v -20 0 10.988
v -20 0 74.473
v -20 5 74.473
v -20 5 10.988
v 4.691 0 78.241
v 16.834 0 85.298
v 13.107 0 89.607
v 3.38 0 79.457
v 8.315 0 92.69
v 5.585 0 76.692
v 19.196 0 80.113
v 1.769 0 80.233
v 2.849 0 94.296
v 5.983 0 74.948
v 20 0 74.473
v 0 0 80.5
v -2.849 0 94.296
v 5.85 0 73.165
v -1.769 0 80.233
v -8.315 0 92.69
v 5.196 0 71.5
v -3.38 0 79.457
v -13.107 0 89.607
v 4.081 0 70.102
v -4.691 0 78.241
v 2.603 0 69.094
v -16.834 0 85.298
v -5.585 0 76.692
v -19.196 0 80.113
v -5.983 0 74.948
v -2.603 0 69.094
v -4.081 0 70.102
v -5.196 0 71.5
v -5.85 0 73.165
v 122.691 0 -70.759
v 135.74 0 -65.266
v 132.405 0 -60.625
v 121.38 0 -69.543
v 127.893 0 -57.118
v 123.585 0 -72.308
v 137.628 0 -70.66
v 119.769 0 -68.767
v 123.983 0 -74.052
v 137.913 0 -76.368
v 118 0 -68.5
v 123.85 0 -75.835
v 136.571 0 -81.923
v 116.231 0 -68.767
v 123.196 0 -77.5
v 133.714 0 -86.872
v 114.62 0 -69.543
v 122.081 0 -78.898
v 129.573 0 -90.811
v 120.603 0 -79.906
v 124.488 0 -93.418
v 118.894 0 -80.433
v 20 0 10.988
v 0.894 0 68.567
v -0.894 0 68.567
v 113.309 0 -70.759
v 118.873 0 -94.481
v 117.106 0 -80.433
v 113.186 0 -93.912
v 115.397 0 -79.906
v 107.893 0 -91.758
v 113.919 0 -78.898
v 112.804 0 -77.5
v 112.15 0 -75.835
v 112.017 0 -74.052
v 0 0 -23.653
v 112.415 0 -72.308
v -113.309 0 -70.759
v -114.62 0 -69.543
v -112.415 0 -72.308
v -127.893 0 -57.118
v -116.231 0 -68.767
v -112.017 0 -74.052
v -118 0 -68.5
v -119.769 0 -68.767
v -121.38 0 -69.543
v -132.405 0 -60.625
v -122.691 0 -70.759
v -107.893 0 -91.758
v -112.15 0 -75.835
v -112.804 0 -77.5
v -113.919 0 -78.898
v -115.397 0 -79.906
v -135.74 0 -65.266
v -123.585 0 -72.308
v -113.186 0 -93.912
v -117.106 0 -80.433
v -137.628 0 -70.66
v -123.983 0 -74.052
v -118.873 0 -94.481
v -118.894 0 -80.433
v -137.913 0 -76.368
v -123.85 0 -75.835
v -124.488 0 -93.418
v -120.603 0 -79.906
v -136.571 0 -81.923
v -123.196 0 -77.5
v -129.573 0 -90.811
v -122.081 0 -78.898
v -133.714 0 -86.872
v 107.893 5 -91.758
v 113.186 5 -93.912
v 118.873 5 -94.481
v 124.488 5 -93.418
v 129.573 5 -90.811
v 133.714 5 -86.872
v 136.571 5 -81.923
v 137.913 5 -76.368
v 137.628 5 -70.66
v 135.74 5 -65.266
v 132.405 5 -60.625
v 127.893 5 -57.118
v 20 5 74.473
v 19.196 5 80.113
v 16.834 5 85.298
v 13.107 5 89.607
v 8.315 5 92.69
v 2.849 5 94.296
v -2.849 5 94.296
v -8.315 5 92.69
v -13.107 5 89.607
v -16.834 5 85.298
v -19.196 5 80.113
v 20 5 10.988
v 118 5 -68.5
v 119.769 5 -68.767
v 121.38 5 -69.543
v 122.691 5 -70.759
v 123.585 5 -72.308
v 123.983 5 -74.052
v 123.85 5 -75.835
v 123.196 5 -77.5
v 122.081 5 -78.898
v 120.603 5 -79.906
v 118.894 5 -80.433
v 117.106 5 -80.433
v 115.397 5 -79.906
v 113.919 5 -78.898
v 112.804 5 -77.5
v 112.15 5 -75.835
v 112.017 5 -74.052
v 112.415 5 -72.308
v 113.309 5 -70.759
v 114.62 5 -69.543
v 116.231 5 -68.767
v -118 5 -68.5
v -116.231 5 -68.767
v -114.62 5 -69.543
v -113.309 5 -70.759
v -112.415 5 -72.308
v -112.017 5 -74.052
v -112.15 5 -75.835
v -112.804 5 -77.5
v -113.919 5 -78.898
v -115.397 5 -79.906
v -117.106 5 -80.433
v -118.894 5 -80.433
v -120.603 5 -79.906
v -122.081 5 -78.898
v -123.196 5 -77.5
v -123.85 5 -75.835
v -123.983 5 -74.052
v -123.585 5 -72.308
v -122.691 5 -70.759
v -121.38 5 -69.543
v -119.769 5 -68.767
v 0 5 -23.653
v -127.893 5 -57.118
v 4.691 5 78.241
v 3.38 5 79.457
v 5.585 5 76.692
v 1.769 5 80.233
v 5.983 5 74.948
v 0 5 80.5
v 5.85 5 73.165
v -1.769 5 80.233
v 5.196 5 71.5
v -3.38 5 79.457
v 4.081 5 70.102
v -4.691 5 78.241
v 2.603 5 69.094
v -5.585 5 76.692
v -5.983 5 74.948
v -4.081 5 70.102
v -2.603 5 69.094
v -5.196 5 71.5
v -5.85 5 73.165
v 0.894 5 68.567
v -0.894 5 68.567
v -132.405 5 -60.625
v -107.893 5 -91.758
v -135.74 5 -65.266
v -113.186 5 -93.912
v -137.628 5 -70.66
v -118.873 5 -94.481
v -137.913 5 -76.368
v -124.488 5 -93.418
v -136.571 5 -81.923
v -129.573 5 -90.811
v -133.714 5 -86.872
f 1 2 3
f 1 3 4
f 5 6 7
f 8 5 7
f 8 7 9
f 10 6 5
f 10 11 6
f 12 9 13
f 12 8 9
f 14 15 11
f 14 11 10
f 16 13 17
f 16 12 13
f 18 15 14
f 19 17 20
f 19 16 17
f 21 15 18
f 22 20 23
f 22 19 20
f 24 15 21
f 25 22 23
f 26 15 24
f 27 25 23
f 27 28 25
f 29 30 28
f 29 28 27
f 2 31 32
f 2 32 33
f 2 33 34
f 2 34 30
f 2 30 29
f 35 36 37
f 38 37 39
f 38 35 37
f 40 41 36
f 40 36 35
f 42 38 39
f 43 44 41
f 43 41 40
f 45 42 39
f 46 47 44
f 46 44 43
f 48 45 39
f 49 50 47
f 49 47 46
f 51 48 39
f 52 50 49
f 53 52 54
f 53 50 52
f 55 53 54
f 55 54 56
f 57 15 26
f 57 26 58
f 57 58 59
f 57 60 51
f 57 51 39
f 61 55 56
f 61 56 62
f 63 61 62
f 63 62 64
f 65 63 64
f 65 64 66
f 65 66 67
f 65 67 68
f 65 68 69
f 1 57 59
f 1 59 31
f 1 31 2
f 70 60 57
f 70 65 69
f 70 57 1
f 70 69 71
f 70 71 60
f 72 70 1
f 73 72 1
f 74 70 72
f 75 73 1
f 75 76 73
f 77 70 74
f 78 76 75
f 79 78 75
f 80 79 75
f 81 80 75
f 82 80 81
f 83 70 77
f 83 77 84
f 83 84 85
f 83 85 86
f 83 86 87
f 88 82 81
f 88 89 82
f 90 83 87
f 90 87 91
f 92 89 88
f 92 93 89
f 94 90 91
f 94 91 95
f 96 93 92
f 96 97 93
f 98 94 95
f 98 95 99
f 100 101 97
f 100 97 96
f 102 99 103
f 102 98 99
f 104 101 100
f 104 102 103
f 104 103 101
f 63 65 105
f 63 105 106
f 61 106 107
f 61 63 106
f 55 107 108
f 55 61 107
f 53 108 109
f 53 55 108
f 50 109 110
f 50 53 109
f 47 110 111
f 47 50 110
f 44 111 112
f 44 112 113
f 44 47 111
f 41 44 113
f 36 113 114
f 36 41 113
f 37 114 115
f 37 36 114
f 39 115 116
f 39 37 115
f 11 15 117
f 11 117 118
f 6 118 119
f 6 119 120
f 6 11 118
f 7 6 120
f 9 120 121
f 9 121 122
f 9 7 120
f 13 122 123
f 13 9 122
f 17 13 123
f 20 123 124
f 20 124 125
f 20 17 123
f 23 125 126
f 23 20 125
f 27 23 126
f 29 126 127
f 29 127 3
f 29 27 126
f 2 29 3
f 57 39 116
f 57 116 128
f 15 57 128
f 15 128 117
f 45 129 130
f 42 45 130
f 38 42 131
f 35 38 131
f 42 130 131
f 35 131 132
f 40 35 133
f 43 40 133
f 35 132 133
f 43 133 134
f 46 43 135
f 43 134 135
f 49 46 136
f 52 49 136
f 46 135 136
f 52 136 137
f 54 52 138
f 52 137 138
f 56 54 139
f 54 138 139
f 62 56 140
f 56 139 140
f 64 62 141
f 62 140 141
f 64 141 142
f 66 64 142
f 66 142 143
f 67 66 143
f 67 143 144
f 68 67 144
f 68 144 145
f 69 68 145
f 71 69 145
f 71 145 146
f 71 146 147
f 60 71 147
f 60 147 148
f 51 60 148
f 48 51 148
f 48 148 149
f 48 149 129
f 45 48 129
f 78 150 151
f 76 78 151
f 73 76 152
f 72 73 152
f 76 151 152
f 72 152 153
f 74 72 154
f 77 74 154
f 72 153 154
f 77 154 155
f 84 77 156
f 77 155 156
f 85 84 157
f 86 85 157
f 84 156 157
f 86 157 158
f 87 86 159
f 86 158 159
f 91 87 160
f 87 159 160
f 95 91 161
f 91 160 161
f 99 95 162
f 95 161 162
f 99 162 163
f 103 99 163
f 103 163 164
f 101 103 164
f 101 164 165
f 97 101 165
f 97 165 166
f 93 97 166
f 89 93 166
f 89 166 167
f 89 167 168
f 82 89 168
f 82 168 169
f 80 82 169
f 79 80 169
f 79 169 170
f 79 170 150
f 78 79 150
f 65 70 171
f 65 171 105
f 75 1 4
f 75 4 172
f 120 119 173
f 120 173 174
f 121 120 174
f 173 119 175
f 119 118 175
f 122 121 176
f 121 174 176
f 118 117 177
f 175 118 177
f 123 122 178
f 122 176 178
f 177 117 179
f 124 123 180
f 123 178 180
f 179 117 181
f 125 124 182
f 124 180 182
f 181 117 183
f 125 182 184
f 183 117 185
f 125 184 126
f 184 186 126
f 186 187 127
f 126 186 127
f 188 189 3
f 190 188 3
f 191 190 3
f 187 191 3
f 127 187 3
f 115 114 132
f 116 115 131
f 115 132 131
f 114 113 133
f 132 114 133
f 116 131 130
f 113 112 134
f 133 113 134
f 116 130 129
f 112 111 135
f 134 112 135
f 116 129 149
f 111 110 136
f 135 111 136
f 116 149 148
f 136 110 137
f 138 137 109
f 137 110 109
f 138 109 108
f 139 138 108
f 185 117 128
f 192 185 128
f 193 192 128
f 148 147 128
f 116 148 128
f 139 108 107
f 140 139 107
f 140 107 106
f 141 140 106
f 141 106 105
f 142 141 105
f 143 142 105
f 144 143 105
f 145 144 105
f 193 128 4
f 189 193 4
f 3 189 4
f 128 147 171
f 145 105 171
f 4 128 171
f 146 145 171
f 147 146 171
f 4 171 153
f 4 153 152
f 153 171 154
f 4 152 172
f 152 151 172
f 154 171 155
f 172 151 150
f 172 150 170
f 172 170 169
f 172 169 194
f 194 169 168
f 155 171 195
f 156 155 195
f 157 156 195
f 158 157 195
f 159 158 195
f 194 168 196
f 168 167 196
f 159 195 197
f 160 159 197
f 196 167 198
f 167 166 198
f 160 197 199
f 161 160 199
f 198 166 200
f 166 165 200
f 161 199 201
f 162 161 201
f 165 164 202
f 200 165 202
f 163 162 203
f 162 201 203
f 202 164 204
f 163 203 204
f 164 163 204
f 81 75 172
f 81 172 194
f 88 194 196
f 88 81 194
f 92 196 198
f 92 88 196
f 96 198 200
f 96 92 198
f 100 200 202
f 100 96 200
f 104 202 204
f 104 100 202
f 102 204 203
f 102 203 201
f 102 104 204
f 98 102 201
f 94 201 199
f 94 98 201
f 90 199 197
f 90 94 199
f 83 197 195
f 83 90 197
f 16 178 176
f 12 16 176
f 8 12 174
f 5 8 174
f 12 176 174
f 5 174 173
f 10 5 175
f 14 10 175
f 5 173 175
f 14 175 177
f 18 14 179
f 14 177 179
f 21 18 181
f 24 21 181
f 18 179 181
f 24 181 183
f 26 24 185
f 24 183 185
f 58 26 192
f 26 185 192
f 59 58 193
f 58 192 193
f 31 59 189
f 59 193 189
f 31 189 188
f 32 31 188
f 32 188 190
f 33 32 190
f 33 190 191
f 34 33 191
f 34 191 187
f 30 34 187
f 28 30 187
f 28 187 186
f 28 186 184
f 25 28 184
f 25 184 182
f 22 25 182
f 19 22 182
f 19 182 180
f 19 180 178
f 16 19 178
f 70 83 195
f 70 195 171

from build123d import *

# Parameters (mm, degrees)
EXTRUDE1_DEPTH = 5
EXTRUDE2_REACH = 169.33
SKETCH2_R      = 6


with BuildPart() as part:
    # Sketch1 → Extrude1 (new body)
    with BuildSketch(Plane(origin=(0, 0, 0), x_dir=(1, 0, 0), z_dir=(0, 1, 0))):
        with BuildLine():
            Line((-107.892566896, 91.758035695), (0, 23.652571955))
            Line((0, 23.652571955), (107.892566896, 91.758035695))
            ThreePointArc((107.892566896, 91.758035695), (135.320402304, 84.500183199), (127.892548484, 57.117897581))
            Line((127.892548484, 57.117897581), (19.999981588, -10.987566159))
            Line((19.999981588, -10.987566159), (19.999981588, -74.472862077))
            ThreePointArc((19.999981588, -74.472862077), (0, -94.5), (-19.999981588, -74.472862077))
            Line((-19.999981588, -74.472862077), (-19.999981588, -10.987566159))
            Line((-19.999981588, -10.987566159), (-127.892548484, 57.117897581))
            ThreePointArc((-127.892548484, 57.117897581), (-135.320402304, 84.500183199), (-107.892566896, 91.758035695))
        make_face()
    extrude(amount=EXTRUDE1_DEPTH)

    # Sketch2 → Extrude2 (cut, up to next)
    with BuildSketch(Plane(origin=(0, 5, 0), x_dir=(-1, 0, 0), z_dir=(0, 1, 0)), mode=Mode.PRIVATE) as extrude2_sk1:
        with Locations(Location((118, -74.5, 0), (0, 0, 90))):
            Circle(SKETCH2_R)
    extrude2_tool1 = extrude(extrude2_sk1.sketch, amount=-EXTRUDE2_REACH, mode=Mode.PRIVATE) & part.part
    # Sketch2 → Extrude2 (cut, up to next)
    with BuildSketch(Plane(origin=(0, 5, 0), x_dir=(-1, 0, 0), z_dir=(0, 1, 0)), mode=Mode.PRIVATE) as extrude2_sk2:
        with Locations(Location((-118, -74.5, 0), (0, 0, 90))):
            Circle(SKETCH2_R)
    extrude2_tool2 = extrude(extrude2_sk2.sketch, amount=-EXTRUDE2_REACH, mode=Mode.PRIVATE) & part.part
    # Sketch2 → Extrude2 (cut, up to next)
    with BuildSketch(Plane(origin=(0, 5, 0), x_dir=(-1, 0, 0), z_dir=(0, 1, 0)), mode=Mode.PRIVATE) as extrude2_sk3:
        with Locations(Location((0, 74.5, 0), (0, 0, 90))):
            Circle(SKETCH2_R)
    extrude2_tool3 = extrude(extrude2_sk3.sketch, amount=-EXTRUDE2_REACH, mode=Mode.PRIVATE) & part.part
    add(extrude2_tool1.solids().sort_by_distance((-118, 5, -74.5))[0], mode=Mode.SUBTRACT)
    add(extrude2_tool2.solids().sort_by_distance((118, 5, -74.5))[0], mode=Mode.SUBTRACT)
    add(extrude2_tool3.solids().sort_by_distance((0, 5, 74.5))[0], mode=Mode.SUBTRACT)


solid = part.part
